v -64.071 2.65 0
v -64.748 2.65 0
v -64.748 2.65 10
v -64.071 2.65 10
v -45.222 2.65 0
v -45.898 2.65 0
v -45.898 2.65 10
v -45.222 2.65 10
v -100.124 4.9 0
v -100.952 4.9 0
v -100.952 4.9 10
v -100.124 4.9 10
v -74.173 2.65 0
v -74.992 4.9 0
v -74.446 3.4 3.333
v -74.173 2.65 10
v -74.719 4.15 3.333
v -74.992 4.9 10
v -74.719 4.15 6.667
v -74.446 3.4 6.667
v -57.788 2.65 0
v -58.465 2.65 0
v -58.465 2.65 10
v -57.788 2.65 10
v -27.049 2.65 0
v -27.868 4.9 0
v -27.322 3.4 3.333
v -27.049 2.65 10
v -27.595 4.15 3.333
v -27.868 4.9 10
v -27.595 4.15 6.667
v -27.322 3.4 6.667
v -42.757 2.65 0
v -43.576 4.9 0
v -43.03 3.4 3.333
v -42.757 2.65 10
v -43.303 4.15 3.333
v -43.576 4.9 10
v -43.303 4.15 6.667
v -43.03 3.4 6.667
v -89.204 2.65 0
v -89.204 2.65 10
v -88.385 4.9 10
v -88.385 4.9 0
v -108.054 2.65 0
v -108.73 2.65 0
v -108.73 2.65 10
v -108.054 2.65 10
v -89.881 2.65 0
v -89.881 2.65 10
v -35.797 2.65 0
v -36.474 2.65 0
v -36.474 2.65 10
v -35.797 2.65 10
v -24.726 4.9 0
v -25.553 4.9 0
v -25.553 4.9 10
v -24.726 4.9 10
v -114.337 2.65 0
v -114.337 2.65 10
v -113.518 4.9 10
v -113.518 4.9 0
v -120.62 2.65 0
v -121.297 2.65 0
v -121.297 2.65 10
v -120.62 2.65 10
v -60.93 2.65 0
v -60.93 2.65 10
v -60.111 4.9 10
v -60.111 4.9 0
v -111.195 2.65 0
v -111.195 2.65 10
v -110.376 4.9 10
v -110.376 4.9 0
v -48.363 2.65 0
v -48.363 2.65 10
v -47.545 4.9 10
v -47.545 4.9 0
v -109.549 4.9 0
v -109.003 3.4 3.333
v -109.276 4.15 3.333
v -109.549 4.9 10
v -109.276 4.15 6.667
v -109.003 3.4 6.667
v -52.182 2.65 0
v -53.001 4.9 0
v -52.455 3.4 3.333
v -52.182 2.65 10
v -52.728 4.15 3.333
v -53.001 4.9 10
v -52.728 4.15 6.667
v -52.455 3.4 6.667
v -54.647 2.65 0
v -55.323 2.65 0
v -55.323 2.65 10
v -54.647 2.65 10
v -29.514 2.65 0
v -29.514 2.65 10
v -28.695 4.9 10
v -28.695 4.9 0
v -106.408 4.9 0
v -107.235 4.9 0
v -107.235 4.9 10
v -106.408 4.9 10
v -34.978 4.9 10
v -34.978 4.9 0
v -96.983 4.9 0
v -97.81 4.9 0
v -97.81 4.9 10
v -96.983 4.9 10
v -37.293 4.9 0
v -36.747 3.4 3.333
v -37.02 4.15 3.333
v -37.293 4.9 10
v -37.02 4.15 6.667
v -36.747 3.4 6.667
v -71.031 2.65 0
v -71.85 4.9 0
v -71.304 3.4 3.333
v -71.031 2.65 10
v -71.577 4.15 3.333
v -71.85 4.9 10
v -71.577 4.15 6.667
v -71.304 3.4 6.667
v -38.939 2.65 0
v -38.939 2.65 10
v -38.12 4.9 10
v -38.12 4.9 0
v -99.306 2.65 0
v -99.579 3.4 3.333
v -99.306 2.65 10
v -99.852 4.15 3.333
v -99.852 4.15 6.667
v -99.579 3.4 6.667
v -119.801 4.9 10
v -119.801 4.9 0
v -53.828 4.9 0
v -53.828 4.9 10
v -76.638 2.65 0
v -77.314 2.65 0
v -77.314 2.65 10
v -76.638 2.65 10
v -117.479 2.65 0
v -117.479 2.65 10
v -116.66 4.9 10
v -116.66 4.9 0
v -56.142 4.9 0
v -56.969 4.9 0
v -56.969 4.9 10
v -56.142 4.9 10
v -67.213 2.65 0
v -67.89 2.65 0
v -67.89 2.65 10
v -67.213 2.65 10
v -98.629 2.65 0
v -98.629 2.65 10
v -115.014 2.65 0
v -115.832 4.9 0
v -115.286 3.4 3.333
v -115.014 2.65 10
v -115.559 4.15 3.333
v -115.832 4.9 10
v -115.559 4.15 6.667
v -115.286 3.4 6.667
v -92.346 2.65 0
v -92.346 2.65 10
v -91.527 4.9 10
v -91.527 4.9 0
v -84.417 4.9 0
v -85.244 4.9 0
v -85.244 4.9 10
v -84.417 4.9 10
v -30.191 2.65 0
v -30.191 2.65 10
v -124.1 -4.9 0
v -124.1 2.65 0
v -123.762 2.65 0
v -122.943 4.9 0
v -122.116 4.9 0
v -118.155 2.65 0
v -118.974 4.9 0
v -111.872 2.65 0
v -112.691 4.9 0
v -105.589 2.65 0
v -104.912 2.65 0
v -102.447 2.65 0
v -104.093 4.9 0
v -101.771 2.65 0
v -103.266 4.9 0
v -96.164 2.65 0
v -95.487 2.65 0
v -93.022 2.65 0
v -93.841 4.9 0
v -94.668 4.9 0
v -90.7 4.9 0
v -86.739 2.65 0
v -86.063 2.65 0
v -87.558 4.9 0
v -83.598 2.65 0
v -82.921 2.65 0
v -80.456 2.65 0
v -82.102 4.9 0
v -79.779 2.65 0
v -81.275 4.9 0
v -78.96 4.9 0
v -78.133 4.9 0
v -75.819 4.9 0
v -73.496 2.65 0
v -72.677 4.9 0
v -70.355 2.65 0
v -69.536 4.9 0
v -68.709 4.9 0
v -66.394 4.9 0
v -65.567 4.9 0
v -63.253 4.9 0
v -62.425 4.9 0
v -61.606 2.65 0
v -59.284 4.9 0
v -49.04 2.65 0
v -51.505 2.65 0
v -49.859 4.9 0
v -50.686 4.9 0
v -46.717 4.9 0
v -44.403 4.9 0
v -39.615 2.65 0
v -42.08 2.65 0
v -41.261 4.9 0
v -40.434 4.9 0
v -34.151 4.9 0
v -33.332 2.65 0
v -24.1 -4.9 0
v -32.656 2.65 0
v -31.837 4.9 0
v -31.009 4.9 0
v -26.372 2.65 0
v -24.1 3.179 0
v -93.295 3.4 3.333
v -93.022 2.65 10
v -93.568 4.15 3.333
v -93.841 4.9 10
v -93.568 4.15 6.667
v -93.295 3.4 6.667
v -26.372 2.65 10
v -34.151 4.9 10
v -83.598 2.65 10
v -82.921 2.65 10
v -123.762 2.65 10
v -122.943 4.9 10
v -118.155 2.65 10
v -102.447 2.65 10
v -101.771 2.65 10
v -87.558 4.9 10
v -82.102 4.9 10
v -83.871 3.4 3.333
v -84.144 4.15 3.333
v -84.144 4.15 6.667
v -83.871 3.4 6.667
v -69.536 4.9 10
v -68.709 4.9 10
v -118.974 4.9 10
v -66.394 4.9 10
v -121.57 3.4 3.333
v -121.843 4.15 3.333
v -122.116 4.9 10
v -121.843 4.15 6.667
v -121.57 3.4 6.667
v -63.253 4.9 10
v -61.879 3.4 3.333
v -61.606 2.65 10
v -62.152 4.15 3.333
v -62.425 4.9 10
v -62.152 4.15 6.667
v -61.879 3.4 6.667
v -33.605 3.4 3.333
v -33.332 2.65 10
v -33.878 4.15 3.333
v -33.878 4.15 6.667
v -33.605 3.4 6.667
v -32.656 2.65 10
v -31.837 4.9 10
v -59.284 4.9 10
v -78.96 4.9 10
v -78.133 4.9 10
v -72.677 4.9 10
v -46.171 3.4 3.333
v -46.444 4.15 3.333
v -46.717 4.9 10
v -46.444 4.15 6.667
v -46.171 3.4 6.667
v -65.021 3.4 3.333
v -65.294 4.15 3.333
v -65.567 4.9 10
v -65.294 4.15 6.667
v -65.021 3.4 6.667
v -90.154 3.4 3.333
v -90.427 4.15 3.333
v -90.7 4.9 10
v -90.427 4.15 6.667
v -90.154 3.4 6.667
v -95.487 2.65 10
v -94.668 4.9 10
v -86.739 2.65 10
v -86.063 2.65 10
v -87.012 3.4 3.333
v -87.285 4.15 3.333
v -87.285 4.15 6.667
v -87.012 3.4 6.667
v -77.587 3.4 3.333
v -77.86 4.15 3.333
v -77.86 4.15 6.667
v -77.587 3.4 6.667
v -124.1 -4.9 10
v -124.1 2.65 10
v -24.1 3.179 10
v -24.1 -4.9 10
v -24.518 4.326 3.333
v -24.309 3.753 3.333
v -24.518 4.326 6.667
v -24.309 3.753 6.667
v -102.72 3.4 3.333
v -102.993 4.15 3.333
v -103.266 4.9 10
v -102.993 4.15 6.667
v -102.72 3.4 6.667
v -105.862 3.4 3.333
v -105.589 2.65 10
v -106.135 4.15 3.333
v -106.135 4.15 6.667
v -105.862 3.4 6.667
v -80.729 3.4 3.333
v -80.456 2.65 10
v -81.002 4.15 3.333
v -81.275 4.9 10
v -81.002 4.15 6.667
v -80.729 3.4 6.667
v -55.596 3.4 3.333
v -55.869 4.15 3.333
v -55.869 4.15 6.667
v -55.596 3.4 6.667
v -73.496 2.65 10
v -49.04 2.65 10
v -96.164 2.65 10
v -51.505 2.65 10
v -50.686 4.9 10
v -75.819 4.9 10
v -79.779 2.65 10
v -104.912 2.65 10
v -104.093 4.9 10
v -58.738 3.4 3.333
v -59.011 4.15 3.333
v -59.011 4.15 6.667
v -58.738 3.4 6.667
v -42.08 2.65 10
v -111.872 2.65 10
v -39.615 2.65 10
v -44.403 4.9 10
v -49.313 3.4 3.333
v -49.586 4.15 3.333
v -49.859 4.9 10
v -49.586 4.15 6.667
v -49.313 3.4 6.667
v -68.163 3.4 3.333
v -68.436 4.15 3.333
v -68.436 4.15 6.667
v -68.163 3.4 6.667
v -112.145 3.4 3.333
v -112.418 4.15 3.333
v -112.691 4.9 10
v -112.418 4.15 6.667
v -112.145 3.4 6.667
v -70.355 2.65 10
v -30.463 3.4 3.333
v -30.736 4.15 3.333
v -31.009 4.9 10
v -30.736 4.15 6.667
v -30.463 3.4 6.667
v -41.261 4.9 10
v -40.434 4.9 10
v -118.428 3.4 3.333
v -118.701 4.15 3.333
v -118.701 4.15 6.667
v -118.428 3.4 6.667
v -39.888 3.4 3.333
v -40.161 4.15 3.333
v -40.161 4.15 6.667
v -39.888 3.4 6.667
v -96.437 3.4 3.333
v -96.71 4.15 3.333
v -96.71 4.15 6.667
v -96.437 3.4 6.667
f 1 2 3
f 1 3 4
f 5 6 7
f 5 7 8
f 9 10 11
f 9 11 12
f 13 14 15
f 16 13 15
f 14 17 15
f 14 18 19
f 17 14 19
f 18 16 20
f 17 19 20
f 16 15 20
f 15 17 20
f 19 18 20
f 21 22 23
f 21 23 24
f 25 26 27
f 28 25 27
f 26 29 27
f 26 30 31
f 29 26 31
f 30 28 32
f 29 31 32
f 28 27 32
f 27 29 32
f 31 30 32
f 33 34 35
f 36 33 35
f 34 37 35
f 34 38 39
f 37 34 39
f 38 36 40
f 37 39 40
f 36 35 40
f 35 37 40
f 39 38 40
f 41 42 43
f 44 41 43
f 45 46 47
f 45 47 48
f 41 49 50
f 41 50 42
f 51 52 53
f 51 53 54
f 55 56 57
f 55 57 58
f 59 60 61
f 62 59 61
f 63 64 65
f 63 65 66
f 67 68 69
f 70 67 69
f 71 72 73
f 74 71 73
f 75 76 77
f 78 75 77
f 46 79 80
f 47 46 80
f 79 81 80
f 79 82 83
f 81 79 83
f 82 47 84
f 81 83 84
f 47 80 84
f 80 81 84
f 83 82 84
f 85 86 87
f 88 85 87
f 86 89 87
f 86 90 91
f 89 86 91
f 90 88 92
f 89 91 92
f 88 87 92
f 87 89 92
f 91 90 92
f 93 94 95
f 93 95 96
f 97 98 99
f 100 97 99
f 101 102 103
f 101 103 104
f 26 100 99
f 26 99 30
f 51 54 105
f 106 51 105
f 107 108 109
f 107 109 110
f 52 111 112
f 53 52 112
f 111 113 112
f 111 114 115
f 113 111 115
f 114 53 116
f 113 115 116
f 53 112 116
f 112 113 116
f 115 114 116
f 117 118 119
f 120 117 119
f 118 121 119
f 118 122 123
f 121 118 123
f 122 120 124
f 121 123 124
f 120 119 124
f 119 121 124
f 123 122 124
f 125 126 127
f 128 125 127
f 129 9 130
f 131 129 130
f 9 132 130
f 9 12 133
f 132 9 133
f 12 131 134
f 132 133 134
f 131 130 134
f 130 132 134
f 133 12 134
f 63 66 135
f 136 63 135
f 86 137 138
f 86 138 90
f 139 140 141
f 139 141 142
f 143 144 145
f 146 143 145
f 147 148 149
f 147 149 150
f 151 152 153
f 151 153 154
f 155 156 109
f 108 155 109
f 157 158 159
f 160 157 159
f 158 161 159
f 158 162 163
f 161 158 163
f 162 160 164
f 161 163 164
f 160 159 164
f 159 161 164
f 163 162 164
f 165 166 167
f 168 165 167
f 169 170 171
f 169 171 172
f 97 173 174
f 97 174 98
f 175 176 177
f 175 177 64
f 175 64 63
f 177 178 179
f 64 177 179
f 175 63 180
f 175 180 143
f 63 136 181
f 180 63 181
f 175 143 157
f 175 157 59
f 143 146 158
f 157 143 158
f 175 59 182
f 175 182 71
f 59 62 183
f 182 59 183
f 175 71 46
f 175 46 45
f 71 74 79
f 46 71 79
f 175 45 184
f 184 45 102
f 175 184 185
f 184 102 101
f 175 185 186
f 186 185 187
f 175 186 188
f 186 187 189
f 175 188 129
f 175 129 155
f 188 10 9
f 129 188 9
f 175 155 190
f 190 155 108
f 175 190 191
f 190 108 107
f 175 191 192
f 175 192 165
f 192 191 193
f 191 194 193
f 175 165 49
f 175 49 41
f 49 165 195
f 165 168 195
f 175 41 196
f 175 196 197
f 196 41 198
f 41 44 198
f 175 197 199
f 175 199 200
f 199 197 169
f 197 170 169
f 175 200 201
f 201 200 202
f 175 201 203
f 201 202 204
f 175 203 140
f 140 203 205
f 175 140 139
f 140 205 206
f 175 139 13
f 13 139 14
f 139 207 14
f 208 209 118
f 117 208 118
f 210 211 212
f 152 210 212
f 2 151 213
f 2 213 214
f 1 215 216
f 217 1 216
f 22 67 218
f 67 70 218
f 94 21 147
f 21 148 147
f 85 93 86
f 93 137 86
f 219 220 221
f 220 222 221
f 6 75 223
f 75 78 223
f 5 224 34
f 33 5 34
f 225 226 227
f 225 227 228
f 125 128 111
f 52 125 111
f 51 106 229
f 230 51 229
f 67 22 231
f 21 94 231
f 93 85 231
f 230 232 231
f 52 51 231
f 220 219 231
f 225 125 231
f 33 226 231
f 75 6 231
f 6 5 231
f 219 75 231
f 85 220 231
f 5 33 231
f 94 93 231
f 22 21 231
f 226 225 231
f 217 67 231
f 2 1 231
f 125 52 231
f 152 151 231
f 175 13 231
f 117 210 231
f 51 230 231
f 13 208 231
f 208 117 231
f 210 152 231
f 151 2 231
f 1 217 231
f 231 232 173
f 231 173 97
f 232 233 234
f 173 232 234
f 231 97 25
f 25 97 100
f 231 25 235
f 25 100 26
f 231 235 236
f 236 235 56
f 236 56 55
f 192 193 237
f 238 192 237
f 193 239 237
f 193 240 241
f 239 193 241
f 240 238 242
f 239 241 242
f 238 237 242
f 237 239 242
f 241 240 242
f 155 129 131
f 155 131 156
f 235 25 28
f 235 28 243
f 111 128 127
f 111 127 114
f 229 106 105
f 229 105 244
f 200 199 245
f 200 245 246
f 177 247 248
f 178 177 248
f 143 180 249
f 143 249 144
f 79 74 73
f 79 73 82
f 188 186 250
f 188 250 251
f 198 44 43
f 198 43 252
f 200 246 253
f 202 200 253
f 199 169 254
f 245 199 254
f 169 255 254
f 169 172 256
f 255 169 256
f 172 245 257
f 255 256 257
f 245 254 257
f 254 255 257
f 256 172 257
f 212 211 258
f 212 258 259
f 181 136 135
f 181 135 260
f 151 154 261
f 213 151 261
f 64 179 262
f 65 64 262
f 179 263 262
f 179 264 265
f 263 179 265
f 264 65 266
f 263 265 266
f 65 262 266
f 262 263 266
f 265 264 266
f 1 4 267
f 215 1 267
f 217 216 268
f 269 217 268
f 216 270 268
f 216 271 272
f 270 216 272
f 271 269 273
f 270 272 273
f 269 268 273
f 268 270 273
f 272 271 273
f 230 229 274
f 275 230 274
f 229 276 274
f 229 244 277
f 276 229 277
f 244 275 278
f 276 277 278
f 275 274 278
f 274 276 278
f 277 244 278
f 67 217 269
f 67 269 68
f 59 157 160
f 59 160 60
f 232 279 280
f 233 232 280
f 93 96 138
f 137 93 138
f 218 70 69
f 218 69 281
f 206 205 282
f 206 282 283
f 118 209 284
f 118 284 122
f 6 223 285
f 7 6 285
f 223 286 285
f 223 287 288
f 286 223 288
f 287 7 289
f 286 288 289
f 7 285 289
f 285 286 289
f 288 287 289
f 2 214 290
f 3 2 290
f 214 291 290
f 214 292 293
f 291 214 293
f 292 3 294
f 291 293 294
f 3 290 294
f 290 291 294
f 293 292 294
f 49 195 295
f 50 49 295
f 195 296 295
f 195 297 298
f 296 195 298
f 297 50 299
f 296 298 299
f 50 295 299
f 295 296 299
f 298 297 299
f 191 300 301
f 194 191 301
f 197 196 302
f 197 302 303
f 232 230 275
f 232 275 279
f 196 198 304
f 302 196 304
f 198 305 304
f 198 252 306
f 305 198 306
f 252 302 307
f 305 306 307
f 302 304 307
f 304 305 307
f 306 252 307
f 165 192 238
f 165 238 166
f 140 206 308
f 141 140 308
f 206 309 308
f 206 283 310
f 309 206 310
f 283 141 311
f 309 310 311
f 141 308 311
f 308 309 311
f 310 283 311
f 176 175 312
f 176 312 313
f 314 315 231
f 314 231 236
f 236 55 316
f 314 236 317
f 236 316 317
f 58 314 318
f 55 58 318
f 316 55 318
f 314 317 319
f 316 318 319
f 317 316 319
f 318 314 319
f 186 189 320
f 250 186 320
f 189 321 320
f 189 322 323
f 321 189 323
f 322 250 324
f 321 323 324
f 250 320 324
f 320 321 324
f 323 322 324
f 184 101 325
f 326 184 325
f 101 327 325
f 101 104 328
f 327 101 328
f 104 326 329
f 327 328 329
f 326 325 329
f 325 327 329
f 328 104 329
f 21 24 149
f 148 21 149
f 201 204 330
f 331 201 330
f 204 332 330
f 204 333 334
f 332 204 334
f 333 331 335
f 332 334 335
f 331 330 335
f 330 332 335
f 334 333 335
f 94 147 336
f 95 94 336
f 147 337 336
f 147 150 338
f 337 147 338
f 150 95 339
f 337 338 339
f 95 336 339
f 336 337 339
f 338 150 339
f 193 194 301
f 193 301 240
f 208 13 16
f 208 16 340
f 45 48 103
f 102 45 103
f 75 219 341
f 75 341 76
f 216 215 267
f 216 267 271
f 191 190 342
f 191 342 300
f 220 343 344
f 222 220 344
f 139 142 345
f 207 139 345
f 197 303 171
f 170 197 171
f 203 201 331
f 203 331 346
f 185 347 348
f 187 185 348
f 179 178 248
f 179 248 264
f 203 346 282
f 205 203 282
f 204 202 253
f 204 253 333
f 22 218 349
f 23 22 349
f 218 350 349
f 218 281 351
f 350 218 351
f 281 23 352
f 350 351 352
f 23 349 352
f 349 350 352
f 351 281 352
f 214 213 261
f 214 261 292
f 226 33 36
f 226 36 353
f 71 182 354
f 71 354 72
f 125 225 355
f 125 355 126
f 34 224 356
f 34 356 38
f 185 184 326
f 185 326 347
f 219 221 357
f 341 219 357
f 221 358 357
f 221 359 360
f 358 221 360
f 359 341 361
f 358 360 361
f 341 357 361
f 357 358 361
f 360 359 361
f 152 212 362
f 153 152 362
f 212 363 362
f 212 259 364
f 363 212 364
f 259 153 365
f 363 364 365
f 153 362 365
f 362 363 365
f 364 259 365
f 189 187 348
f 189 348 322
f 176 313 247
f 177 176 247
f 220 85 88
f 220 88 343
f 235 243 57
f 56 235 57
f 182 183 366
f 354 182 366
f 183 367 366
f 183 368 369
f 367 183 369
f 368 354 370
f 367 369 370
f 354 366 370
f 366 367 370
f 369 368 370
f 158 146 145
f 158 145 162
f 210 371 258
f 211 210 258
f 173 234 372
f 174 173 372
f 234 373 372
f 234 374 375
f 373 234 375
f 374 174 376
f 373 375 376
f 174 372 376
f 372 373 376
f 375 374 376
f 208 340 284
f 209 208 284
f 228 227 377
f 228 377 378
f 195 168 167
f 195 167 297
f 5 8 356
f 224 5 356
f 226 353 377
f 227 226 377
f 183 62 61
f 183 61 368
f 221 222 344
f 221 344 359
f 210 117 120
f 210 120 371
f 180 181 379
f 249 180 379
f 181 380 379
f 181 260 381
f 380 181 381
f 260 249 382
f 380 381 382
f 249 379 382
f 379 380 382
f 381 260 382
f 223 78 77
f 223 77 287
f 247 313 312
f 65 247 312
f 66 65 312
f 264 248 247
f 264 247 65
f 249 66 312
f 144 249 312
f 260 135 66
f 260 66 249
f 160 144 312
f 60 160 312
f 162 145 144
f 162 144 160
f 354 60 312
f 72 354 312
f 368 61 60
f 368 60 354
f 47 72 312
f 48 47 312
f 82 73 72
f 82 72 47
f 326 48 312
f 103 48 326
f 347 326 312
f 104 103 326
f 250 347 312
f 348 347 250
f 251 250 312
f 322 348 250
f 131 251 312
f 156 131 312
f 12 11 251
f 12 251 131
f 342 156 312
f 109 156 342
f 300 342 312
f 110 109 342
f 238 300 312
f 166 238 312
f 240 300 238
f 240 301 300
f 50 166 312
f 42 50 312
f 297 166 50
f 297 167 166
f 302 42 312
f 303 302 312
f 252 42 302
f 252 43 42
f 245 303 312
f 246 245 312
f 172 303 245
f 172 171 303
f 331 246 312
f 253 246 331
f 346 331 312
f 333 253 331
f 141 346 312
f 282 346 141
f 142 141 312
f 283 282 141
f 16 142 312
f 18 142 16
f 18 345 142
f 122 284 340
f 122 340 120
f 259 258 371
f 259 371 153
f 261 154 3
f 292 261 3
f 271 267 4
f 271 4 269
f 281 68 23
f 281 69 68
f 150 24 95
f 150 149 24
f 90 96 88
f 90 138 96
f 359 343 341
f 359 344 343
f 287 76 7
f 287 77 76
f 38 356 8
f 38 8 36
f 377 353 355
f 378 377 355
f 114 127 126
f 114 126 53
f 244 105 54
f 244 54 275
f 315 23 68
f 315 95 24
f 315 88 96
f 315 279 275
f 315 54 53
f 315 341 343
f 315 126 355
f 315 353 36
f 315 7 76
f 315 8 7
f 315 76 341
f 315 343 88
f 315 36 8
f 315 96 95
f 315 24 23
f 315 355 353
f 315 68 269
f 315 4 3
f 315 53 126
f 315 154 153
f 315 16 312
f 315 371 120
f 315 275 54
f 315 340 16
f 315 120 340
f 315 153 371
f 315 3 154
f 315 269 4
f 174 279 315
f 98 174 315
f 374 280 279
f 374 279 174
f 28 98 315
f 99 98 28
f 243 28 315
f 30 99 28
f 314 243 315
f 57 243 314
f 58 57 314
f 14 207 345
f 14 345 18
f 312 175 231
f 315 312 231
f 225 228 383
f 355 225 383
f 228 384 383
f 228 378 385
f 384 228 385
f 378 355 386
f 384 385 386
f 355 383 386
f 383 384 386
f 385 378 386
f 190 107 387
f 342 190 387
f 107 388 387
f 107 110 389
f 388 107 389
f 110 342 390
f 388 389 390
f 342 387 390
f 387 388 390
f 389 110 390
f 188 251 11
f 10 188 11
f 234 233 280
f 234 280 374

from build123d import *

# Parameters (mm, degrees)
RITNING_1_W          = 250
RITNING_1_H          = 9.8
KUGGST_NGS_MNE_DEPTH = 10
KUGGLUCKA_DEPTH      = 10
LPATTERN_COUNT       = 80
LPATTERN_PITCH       = 3.14159265
CUT_EXTRUDE1_DEPTH   = 10


with BuildPart() as part:
    # Ritning 1 → Kuggstångsämne (new body)
    with BuildSketch(Plane.XY):
        with Locations((0.9, 0)):
            Rectangle(RITNING_1_W, RITNING_1_H)
    extrude(amount=KUGGST_NGS_MNE_DEPTH)

    # Ritning 2 → Kugglucka (cut)
    with BuildSketch(Plane.XY.offset(10)):
        with BuildLine():
            Line((-124.438289352, 2.65), (-123.761710648, 2.65))
            Line((-123.761710648, 2.65), (-122.942777621, 4.9))
            Line((-122.942777621, 4.9), (-124.1, 6.057222379))
            Line((-124.1, 6.057222379), (-125.257222379, 4.9))
            add(Edge.make_bspline(
                [(-125.257222379, 4.9), (-124.984244704, 4.15), (-124.711267028, 3.4), (-124.438289352, 2.65)],
                knots=[0, 0, 0, 0, 1, 1, 1, 1], degree=3))
        make_face()
    kugglucka = extrude(amount=-KUGGLUCKA_DEPTH, mode=Mode.SUBTRACT)

    # LPattern: Kugglucka ×80
    with Locations(*[(i * LPATTERN_PITCH, 0, 0) for i in range(1, LPATTERN_COUNT)]):
        add(kugglucka, mode=Mode.SUBTRACT)

    # Sketch1 → Cut-Extrude1 (cut)
    with BuildSketch(Plane.XY.offset(10)):
        Polygon((-24.1, -4.9), (-24.1, 34.404726266), (165.055883849, 34.404726266), (170.123246632, -36.805056005), (-46.973243137, -44.806155137), align=None)
    extrude(amount=-CUT_EXTRUDE1_DEPTH, mode=Mode.SUBTRACT)


solid = part.part
